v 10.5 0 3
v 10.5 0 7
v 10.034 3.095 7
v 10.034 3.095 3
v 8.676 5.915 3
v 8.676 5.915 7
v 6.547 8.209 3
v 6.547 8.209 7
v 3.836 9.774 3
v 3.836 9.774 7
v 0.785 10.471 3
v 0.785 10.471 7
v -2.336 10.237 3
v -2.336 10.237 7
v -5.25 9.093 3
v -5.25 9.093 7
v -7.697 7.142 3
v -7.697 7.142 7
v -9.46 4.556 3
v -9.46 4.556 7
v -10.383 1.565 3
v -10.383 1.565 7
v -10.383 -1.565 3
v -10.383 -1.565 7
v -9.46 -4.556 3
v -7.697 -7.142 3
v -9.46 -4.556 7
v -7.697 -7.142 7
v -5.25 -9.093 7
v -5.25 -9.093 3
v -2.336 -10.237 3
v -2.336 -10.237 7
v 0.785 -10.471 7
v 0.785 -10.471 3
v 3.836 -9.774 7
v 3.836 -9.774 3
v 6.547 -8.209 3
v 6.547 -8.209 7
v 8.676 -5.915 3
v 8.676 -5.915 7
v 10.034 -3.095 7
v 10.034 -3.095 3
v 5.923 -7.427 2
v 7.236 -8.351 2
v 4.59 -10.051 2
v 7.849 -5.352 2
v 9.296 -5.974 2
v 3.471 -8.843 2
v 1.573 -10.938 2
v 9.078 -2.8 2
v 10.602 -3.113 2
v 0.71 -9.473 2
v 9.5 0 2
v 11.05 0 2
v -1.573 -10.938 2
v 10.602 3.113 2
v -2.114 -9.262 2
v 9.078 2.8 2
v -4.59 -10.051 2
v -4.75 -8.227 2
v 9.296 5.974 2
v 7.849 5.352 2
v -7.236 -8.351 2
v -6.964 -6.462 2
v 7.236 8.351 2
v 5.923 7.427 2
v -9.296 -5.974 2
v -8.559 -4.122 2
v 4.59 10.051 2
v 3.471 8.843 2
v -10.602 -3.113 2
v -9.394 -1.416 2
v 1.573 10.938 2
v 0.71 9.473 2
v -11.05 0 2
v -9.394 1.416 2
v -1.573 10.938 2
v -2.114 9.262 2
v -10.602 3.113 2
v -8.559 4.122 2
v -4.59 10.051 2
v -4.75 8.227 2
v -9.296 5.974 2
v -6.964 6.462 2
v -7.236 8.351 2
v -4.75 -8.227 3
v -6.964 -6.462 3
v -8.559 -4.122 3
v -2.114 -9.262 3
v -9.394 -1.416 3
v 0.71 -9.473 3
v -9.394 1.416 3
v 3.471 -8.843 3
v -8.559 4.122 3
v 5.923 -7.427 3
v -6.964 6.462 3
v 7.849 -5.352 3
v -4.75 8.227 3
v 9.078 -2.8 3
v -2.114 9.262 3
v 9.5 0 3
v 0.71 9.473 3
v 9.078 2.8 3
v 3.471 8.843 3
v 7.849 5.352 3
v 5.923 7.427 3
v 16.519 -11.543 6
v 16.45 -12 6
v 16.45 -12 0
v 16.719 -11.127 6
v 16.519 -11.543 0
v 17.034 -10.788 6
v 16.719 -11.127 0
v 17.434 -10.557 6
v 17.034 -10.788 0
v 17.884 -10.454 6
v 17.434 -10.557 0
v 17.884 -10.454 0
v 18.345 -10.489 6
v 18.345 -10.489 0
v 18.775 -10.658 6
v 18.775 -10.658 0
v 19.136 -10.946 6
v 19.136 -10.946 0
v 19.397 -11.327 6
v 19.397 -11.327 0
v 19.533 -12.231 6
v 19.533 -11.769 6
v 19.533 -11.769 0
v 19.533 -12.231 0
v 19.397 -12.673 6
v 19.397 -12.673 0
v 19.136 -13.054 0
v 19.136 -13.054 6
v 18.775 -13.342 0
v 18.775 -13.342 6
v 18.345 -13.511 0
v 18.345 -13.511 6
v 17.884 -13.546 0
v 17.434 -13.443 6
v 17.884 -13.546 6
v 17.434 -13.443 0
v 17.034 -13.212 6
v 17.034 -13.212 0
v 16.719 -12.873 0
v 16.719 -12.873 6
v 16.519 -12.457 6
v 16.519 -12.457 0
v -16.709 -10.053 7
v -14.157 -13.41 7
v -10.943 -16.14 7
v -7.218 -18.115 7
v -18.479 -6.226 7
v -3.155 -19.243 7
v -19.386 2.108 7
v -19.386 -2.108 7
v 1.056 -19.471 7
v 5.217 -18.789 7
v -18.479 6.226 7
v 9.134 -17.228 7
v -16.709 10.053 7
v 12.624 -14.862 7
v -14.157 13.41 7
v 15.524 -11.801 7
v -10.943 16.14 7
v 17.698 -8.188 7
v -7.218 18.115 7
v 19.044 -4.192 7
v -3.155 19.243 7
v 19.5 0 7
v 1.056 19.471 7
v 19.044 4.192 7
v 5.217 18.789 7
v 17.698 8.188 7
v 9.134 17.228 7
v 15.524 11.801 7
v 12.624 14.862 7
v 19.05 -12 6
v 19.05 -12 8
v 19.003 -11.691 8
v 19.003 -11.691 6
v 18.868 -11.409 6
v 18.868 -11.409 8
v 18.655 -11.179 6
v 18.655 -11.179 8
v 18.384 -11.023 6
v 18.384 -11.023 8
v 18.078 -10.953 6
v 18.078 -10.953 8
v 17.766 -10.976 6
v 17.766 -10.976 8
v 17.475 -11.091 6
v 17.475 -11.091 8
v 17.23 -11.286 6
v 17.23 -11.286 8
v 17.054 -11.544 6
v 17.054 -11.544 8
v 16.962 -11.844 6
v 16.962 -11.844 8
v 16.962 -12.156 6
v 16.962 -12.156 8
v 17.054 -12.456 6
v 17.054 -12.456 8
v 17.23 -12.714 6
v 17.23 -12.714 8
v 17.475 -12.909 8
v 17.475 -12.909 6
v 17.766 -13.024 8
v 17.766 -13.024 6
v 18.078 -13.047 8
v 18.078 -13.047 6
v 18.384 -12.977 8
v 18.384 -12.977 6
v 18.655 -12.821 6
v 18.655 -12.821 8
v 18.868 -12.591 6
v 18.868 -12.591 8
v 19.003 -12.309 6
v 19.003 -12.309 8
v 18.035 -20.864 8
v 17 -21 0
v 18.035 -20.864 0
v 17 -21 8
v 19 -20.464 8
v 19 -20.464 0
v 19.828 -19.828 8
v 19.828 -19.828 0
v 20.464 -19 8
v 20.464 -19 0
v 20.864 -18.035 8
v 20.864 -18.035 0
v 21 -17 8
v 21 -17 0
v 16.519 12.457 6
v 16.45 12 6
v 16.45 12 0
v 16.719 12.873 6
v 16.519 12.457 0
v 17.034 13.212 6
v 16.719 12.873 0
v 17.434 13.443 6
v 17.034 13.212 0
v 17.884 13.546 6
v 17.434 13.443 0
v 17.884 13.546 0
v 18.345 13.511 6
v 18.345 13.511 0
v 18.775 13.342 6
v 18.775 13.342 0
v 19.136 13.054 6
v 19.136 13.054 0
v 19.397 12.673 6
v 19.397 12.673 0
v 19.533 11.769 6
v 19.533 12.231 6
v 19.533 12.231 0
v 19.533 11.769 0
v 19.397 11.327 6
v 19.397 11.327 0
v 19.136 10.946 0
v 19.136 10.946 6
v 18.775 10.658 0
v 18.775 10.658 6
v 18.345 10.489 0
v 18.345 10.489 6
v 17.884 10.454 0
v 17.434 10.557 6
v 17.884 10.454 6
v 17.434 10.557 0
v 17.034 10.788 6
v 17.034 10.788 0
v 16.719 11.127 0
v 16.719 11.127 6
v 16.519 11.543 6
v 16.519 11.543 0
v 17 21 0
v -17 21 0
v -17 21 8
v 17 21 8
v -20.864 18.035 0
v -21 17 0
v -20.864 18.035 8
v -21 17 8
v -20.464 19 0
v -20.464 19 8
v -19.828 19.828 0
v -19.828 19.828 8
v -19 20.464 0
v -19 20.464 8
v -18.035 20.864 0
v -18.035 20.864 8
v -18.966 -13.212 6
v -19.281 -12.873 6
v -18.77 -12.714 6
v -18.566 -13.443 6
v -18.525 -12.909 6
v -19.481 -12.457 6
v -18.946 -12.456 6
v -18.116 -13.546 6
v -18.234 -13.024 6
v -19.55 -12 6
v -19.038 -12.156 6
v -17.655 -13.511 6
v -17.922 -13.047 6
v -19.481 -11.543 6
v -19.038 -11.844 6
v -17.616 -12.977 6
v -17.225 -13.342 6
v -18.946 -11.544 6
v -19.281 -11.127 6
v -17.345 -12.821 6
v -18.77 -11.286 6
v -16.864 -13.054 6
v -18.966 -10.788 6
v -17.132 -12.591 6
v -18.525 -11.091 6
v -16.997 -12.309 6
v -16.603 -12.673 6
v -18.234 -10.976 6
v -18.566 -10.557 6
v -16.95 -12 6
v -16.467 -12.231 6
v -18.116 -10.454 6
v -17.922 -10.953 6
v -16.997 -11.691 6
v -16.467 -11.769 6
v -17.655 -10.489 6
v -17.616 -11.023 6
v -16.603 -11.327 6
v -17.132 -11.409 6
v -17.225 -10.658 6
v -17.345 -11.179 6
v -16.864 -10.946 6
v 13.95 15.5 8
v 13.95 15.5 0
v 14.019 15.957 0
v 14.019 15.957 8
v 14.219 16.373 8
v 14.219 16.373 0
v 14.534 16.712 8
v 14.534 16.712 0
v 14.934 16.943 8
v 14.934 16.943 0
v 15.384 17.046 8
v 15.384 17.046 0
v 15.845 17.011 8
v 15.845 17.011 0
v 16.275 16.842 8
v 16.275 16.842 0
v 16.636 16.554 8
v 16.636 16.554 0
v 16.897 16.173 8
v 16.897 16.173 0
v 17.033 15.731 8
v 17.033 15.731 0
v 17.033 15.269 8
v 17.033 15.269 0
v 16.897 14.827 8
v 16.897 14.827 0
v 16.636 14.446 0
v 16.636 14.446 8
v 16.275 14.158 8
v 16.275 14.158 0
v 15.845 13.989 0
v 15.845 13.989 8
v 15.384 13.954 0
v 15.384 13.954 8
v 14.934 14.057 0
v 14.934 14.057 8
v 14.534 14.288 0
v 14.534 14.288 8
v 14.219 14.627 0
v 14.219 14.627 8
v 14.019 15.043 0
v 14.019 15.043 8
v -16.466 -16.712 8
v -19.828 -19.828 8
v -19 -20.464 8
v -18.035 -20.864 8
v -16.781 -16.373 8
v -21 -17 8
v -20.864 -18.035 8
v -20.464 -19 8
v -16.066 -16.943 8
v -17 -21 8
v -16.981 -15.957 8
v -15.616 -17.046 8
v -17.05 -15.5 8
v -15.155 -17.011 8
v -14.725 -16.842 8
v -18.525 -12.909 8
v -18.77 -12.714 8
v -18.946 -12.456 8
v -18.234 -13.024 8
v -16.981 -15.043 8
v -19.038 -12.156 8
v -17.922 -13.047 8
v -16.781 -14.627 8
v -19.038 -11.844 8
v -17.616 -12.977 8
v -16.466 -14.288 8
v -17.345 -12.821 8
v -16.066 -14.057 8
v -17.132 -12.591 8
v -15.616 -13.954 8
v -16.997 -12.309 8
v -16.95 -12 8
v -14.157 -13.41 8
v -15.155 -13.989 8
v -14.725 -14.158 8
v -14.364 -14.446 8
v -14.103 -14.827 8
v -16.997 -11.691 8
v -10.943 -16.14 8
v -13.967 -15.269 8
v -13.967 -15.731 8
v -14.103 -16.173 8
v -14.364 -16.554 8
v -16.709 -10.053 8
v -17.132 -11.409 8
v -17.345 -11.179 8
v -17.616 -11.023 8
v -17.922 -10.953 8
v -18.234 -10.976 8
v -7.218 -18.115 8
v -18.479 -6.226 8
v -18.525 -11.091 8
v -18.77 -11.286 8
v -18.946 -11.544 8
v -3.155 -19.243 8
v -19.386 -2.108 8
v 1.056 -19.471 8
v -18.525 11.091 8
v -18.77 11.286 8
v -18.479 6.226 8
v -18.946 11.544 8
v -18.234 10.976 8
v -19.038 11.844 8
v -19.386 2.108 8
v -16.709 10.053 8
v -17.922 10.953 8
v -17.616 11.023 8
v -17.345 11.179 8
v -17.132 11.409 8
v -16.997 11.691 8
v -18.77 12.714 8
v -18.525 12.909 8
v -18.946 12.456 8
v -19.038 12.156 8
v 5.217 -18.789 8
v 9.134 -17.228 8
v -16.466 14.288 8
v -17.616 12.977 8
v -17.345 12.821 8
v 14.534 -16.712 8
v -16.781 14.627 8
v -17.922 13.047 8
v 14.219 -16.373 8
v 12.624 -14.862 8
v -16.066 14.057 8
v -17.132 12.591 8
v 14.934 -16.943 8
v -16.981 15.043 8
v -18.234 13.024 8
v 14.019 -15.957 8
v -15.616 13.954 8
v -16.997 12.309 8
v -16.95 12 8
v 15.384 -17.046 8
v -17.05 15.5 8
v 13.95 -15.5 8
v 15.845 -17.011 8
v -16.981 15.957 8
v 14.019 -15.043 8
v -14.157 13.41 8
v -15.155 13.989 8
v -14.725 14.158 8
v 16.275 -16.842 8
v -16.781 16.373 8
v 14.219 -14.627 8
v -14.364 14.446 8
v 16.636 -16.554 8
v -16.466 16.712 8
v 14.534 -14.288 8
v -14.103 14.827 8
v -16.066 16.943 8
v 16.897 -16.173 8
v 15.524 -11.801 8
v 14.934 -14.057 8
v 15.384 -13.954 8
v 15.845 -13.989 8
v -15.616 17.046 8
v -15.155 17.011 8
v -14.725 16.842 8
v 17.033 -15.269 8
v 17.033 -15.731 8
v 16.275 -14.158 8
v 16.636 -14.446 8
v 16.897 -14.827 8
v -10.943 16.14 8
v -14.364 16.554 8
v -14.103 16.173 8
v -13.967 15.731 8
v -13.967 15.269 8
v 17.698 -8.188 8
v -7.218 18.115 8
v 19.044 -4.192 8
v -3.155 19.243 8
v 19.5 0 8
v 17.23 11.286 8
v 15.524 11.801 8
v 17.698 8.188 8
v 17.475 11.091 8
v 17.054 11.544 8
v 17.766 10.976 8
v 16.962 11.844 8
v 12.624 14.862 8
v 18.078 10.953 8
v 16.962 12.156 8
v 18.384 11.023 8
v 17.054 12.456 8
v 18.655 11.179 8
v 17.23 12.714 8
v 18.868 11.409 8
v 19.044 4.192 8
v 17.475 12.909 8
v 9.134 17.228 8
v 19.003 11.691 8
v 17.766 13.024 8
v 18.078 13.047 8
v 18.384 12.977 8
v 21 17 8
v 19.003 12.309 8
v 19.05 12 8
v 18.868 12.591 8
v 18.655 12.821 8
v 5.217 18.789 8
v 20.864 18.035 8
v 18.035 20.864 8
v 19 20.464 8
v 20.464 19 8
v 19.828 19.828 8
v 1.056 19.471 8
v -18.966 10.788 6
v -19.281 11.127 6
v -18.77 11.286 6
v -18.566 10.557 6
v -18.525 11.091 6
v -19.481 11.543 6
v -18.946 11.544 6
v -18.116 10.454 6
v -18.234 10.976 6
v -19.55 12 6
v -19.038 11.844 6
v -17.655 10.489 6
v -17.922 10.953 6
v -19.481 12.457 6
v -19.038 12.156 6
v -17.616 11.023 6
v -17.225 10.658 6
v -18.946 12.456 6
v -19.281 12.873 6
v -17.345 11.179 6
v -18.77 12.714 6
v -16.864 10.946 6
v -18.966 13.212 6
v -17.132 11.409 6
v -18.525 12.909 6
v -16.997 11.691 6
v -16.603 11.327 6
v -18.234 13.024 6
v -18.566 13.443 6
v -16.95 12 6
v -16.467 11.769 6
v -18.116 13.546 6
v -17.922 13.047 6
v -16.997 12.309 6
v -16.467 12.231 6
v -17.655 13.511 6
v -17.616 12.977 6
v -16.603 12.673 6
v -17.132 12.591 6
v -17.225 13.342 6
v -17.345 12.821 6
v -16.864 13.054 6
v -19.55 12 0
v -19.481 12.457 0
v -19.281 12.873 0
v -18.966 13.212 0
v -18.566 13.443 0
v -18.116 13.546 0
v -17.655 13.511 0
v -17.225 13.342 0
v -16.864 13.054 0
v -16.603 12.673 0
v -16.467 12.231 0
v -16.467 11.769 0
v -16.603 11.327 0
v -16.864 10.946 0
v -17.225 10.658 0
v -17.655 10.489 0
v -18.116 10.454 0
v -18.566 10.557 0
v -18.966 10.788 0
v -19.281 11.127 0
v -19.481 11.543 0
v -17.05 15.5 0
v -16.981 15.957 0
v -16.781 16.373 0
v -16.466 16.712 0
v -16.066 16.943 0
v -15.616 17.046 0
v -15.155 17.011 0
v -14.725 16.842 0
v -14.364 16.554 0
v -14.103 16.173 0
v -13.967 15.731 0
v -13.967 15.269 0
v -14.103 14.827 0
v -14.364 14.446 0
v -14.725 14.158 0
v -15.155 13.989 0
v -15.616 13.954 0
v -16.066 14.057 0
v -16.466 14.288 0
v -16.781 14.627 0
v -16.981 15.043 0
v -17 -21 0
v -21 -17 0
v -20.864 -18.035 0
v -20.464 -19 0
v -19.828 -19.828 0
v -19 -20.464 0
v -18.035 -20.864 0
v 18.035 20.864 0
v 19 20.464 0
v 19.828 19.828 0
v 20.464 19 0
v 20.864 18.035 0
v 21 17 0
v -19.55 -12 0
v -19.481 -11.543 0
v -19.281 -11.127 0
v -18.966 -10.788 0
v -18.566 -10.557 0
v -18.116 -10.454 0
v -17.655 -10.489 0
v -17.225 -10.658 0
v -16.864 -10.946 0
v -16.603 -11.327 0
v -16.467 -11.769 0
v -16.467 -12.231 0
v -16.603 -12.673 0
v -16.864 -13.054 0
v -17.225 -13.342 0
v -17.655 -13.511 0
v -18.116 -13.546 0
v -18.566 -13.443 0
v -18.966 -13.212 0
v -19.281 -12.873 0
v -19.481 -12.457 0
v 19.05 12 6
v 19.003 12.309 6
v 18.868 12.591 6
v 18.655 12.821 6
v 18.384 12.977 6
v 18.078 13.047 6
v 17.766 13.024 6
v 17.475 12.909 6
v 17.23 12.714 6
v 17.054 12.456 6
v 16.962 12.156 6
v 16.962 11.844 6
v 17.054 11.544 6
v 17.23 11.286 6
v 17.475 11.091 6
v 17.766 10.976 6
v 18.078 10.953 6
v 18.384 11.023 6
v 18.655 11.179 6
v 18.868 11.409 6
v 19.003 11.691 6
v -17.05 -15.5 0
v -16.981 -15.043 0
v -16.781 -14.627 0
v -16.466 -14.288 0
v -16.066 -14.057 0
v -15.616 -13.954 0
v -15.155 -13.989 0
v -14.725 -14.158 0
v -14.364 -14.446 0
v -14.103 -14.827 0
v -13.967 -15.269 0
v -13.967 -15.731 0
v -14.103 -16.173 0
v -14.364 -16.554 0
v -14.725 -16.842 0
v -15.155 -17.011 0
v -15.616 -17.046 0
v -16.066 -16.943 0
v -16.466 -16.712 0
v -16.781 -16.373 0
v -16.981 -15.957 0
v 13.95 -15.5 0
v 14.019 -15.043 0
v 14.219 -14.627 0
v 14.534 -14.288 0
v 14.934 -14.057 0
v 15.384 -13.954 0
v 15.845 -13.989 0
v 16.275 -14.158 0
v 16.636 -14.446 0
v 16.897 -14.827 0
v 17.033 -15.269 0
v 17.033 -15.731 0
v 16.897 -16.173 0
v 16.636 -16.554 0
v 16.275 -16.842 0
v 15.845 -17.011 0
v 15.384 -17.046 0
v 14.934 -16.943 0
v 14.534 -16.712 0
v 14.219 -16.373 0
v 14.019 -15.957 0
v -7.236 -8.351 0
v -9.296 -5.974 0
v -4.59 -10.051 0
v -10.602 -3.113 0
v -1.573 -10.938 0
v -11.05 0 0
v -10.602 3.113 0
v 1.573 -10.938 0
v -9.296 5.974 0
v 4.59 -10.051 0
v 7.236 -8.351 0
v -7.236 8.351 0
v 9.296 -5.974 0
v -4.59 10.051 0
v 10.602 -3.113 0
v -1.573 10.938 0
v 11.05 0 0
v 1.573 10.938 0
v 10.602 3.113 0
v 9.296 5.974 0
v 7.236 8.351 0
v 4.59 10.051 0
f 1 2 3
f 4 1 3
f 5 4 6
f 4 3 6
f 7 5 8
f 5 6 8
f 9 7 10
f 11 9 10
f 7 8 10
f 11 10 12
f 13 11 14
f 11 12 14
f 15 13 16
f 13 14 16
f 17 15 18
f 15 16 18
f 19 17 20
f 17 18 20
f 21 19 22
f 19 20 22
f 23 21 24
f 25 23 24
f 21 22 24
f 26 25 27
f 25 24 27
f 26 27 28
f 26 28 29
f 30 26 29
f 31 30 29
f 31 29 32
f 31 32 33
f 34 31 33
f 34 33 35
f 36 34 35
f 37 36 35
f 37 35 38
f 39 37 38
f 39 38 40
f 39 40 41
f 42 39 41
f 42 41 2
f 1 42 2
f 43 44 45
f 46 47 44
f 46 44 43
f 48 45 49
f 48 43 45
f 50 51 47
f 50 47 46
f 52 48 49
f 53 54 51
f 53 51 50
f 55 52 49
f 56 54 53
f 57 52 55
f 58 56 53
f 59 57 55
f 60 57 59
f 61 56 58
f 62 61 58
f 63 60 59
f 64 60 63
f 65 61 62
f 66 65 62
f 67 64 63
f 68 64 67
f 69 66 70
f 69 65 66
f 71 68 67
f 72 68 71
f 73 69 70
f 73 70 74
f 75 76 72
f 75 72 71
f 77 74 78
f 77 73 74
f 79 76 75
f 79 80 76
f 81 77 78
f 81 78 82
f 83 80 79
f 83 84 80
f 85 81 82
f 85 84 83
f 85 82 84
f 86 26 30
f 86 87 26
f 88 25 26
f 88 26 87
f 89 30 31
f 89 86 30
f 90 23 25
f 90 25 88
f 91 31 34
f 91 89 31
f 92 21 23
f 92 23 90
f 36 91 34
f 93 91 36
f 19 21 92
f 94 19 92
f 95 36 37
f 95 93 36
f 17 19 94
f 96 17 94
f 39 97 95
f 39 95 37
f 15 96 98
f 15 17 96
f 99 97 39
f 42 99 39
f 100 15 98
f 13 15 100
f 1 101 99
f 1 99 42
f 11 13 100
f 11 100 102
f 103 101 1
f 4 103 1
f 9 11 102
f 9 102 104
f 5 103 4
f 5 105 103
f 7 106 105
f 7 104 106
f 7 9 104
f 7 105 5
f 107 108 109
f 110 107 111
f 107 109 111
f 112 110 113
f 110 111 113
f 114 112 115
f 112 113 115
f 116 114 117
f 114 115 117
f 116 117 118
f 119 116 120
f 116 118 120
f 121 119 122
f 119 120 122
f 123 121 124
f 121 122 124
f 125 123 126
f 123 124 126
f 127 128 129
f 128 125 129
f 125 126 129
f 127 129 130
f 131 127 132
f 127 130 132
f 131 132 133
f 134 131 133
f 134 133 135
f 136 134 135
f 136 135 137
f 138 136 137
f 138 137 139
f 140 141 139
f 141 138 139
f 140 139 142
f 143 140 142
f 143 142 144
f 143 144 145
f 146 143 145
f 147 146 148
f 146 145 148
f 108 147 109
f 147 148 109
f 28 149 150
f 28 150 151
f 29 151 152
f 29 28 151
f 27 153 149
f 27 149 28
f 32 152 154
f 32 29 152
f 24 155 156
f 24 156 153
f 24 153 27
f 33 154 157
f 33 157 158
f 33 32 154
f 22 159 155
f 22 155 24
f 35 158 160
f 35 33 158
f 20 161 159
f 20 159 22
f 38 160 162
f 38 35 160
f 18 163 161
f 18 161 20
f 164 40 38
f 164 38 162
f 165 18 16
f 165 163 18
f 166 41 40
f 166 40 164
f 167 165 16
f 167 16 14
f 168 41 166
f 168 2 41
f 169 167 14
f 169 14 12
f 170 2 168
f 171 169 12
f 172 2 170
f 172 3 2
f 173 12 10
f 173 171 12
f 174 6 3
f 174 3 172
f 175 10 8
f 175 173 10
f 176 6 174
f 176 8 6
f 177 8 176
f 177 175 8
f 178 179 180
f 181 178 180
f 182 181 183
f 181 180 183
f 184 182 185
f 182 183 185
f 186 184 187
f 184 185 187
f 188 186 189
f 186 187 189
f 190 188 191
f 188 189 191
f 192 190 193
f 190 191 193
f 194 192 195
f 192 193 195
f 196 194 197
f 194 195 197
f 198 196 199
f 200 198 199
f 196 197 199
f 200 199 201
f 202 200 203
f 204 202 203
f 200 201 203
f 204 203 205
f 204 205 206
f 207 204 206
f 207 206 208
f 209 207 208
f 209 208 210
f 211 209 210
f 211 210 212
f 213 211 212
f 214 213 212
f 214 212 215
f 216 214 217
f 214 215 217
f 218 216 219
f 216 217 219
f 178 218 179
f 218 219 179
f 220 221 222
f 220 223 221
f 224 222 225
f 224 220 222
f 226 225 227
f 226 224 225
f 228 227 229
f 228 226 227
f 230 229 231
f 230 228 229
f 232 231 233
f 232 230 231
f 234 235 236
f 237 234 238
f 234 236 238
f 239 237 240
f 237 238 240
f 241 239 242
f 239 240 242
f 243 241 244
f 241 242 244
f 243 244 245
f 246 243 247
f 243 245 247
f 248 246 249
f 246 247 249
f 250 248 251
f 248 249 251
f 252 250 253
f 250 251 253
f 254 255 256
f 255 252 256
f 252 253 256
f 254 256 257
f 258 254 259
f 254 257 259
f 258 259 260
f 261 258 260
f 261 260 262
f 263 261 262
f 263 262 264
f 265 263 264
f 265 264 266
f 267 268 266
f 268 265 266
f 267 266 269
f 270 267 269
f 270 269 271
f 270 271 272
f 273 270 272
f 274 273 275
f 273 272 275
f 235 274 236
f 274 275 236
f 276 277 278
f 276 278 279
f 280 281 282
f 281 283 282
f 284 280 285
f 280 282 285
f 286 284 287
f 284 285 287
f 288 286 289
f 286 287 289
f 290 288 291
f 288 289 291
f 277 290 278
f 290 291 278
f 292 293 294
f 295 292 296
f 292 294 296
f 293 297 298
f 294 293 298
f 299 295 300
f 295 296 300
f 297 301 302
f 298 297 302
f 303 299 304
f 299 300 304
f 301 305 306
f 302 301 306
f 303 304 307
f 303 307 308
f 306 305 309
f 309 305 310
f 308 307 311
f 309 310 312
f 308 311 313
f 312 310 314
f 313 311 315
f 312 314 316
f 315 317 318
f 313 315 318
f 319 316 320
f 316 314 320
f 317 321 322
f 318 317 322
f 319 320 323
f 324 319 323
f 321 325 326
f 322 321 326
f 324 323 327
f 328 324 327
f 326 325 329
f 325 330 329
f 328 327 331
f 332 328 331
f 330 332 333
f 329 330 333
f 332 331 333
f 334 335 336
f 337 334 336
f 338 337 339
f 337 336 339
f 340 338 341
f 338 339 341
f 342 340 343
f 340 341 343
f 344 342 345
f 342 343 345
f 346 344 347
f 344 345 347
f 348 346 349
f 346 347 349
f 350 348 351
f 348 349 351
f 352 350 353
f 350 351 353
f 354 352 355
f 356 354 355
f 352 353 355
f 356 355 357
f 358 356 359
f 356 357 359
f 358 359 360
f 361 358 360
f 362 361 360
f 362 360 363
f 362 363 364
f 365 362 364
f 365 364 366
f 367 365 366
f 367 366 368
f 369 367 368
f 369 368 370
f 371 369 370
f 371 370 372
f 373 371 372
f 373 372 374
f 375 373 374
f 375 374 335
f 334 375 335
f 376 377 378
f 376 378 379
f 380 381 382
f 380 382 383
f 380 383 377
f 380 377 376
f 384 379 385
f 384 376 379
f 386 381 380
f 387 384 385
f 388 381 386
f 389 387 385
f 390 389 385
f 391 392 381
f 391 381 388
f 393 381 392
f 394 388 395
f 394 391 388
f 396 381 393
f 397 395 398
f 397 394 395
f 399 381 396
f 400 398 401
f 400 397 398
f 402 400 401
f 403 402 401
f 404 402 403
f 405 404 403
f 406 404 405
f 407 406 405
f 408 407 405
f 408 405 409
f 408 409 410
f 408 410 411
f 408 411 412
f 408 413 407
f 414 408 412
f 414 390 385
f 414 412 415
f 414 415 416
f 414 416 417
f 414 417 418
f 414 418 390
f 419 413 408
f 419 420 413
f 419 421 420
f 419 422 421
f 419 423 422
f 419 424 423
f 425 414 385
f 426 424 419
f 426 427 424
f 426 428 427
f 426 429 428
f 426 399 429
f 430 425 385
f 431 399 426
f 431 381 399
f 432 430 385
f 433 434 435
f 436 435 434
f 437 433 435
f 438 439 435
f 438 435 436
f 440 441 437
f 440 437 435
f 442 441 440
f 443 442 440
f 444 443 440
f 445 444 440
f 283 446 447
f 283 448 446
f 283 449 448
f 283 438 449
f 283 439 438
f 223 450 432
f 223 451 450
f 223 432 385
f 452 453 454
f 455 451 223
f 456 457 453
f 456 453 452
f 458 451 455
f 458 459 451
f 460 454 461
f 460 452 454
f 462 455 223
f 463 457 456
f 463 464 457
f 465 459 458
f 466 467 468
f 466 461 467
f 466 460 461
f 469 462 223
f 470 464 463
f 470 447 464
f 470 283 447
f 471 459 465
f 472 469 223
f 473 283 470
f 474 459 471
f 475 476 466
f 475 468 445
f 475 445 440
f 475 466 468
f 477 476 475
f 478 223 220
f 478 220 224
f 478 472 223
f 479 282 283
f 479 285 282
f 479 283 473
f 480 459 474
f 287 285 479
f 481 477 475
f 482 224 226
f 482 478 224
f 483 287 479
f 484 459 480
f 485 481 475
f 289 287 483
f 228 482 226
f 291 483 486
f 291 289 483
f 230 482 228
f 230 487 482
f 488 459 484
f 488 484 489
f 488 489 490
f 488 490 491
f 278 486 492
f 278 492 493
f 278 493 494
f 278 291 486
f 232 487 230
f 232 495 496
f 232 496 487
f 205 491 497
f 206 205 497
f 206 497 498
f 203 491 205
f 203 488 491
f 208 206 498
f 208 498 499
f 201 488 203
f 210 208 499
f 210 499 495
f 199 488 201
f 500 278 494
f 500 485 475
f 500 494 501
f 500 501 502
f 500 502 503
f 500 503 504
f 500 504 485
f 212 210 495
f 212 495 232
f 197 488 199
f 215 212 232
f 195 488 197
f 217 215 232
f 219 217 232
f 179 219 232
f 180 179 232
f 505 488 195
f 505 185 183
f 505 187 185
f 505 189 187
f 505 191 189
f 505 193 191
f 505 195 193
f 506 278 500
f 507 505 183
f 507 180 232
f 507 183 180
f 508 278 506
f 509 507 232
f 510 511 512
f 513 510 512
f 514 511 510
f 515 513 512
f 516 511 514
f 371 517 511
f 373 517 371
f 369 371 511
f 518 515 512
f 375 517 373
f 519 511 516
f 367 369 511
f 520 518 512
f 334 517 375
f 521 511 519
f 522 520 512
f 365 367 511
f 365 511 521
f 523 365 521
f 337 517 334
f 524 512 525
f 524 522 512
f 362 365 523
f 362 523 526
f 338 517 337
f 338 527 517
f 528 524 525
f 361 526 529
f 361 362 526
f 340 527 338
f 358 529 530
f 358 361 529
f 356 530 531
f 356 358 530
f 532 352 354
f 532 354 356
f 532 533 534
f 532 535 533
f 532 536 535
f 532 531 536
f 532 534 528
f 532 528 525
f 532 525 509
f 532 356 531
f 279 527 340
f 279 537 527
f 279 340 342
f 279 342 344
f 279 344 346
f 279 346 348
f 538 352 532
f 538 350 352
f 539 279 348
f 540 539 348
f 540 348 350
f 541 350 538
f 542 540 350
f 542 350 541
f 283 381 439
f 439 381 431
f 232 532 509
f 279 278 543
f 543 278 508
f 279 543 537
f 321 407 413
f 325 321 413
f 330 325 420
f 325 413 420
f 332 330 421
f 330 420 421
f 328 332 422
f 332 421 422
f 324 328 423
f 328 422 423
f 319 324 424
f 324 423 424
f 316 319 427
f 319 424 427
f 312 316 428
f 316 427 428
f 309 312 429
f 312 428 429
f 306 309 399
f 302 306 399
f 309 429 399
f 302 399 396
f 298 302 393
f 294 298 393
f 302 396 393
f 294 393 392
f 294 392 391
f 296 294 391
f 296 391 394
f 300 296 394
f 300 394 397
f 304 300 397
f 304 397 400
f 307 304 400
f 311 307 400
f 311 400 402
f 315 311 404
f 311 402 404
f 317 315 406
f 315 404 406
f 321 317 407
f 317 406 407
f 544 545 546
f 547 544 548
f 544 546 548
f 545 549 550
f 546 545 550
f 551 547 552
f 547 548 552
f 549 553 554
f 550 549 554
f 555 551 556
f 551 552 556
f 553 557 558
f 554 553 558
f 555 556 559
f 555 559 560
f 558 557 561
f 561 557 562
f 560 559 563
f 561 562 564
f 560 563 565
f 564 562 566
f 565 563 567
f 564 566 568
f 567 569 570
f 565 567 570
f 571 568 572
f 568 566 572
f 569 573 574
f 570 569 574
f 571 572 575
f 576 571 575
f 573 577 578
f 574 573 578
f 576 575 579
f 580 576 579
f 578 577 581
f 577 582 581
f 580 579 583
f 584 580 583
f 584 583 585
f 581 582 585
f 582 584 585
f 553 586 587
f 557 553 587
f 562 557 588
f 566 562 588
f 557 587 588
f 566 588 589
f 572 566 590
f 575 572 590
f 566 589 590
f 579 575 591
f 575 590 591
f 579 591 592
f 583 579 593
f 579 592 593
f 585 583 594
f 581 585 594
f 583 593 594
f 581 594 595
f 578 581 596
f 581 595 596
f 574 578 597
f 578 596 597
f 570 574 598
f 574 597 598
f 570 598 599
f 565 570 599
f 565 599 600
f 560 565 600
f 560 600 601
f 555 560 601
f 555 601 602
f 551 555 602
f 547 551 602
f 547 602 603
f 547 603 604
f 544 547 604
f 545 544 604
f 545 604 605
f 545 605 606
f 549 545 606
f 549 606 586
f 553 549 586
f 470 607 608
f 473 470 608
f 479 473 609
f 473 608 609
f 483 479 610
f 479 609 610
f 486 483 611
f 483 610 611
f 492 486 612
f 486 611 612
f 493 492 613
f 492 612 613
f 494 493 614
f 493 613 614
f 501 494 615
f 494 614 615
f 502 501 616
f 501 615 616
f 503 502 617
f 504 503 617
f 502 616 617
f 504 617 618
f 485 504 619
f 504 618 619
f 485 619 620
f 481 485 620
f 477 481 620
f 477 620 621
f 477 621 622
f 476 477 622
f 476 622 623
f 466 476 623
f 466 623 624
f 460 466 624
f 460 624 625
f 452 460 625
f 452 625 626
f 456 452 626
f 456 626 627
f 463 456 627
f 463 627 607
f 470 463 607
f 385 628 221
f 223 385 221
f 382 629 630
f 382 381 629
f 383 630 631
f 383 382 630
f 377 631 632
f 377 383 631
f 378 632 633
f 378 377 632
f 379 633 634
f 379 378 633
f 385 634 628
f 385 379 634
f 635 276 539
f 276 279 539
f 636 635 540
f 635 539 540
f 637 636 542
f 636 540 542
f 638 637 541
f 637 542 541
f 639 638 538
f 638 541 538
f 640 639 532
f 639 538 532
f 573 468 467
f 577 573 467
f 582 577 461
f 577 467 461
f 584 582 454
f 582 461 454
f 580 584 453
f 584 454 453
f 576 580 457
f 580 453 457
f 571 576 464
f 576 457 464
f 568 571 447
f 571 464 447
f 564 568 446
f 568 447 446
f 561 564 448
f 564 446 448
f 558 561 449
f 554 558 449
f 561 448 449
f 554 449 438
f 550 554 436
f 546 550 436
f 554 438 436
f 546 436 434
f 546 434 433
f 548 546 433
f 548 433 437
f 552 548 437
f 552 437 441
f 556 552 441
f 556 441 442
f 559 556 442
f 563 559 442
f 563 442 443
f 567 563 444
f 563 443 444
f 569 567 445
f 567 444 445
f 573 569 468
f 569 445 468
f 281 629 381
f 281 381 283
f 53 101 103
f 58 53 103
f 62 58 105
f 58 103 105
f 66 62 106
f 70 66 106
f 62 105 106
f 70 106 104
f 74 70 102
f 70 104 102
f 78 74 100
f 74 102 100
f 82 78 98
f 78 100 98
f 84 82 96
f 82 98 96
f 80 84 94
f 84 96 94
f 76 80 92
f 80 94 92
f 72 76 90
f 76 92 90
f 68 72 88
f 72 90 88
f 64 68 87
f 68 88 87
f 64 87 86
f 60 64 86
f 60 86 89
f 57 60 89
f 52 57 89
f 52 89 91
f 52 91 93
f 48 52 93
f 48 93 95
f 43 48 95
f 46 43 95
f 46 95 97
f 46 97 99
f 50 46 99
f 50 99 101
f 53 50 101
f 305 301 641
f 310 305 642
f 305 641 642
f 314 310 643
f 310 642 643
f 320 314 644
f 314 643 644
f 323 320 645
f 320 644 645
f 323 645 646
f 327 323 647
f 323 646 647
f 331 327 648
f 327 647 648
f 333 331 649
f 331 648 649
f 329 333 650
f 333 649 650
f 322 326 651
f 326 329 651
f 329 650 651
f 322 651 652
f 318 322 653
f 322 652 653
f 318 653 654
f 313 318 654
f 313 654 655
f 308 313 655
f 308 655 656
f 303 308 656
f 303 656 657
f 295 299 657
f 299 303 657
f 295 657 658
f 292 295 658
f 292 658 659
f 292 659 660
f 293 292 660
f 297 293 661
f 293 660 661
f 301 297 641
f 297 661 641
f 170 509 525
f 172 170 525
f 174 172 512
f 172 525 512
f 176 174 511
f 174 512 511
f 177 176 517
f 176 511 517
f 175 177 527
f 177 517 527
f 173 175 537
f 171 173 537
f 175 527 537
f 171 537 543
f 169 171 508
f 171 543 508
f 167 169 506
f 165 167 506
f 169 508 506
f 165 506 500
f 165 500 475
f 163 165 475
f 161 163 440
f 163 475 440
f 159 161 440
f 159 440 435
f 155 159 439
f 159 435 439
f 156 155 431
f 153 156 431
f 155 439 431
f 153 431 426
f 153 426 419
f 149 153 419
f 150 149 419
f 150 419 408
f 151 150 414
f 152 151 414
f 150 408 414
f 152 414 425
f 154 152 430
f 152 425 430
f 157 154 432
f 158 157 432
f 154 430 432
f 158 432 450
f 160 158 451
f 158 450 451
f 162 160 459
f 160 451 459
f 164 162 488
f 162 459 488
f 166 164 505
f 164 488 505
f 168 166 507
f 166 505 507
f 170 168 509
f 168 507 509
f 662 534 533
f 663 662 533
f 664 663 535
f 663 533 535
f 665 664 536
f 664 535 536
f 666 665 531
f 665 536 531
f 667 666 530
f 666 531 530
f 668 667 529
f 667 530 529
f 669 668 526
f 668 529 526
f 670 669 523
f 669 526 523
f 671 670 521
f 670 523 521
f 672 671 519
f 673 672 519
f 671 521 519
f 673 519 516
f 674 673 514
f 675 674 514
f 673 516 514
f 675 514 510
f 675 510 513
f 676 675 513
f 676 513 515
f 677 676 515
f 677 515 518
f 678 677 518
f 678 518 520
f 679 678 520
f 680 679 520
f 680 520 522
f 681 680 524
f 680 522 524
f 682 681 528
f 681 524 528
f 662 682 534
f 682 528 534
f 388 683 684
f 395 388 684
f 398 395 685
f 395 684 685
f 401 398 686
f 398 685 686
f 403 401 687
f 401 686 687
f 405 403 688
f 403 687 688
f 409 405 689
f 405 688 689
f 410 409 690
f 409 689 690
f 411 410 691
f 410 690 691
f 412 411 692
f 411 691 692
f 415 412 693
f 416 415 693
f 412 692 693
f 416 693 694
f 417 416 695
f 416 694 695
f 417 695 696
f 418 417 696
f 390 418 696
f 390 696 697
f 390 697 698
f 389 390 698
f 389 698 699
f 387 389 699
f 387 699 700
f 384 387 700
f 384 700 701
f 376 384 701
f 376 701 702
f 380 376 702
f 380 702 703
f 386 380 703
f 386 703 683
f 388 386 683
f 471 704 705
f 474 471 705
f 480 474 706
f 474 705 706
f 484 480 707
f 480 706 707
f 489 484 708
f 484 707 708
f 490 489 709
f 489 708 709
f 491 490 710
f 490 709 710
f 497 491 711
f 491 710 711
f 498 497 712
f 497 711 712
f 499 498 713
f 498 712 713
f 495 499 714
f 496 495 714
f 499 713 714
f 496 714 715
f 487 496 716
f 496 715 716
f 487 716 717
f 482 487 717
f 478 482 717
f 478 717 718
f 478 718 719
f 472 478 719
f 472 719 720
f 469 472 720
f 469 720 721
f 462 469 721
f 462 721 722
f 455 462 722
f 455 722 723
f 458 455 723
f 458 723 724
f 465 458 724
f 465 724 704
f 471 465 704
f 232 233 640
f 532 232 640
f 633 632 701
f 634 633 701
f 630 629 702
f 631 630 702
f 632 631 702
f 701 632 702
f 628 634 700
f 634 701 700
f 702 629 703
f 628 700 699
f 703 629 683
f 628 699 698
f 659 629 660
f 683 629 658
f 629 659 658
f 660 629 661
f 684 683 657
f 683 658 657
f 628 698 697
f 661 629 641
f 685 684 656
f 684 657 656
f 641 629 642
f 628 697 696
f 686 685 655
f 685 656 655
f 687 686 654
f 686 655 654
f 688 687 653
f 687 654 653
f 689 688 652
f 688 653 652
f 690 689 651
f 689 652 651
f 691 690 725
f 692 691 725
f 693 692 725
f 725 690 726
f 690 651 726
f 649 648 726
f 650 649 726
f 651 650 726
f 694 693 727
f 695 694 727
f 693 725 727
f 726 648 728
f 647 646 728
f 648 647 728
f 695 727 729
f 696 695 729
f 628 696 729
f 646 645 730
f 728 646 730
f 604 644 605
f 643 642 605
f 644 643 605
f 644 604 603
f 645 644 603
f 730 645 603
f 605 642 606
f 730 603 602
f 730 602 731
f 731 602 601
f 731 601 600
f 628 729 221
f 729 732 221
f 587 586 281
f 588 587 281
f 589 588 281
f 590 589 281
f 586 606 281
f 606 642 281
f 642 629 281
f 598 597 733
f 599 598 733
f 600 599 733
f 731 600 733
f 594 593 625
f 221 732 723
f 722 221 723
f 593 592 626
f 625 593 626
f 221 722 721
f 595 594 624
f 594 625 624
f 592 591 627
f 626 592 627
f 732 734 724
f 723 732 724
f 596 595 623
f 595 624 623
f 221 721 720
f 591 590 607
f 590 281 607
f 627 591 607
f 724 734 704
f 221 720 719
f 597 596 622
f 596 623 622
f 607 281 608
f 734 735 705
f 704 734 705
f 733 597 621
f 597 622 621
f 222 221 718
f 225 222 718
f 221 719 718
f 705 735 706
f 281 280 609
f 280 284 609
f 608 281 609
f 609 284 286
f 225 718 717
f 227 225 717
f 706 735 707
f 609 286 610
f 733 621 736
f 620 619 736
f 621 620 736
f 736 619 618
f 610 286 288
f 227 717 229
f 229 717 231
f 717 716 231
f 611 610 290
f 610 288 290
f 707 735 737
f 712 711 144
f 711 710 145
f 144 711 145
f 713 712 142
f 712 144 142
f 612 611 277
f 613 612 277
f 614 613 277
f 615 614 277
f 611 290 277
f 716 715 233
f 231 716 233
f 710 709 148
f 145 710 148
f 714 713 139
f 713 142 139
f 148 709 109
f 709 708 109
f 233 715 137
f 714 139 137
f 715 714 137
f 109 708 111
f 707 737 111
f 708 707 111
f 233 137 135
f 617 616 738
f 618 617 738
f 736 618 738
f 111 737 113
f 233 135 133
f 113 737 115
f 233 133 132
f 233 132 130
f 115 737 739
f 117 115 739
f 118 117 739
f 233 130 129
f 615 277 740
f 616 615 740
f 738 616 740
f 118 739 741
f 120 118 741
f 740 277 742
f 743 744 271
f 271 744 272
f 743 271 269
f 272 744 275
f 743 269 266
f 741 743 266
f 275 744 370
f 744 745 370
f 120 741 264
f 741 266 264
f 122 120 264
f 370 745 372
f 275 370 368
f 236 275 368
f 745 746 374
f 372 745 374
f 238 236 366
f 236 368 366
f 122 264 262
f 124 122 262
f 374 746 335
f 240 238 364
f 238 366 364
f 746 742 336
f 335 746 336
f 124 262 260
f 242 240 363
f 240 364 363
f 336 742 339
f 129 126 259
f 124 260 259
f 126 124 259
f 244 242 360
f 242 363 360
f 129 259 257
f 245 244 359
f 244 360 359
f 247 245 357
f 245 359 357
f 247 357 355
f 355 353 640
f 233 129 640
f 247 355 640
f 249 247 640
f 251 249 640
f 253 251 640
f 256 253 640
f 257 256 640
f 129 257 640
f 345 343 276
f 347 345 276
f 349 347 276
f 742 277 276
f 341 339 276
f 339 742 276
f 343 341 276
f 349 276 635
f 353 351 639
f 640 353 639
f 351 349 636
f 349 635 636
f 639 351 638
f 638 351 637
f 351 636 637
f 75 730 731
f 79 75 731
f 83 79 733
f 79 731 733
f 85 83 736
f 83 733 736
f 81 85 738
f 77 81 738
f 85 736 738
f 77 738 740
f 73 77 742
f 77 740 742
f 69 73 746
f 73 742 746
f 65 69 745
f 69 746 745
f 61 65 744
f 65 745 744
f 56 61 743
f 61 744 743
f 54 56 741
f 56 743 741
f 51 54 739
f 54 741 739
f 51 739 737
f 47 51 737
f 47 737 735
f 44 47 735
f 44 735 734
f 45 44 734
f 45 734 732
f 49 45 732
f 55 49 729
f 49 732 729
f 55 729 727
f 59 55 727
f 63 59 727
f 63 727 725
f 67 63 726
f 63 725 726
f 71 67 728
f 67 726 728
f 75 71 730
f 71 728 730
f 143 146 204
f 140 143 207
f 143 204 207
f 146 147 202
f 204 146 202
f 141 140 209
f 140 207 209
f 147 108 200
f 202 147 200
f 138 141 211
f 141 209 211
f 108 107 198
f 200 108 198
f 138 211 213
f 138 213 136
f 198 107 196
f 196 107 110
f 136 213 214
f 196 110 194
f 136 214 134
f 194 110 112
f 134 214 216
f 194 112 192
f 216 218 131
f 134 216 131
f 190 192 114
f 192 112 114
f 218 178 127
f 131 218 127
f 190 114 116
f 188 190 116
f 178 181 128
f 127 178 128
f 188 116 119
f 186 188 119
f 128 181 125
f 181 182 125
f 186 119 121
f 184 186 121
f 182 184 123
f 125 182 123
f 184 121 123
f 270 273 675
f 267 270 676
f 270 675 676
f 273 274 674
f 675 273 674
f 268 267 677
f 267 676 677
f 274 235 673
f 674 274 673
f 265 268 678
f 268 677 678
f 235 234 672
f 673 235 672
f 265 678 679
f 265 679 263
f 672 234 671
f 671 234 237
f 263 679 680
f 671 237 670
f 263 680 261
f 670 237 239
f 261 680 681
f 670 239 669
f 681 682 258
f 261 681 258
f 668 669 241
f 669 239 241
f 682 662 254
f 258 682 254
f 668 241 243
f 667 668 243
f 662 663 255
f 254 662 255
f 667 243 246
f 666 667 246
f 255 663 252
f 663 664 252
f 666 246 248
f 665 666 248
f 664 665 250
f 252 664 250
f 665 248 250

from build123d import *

# Parameters (mm, degrees)
SKETCH_1_W          = 42
SKETCH_1_H          = 42
EXTRUDE_1_DEPTH     = 8
SKETCH_2_R          = 9.5
CUT_EXTRUDE_1_DEPTH = 9
SKETCH_3_R          = 10.5
CUT_EXTRUDE_2_DEPTH = 5
SKETCH_6_R          = 11.05
CUT_EXTRUDE_3_DEPTH = 2
FILLET_1_R          = 4
SKETCH_8_R          = 19.5
CUT_EXTRUDE_4_DEPTH = 1
SKETCH_9_R          = 1.55
CUT_EXTRUDE_5_DEPTH = 9
SKETCH_10_R         = 1.55
CUT_EXTRUDE_6_DEPTH = 9
SKETCH_11_R         = 1.55
SKETCH_11_R_2       = 1.05
EXTRUDE_3_DEPTH     = 2


with BuildPart() as part:
    # 草图1 → 凸台-拉伸1 (new body)
    with BuildSketch(Plane.XY):
        Rectangle(SKETCH_1_W, SKETCH_1_H)
    extrude(amount=EXTRUDE_1_DEPTH)

    # 草图2 → 切除-拉伸1 (cut, through all)
    with BuildSketch(Plane.XY.offset(8)):
        Circle(SKETCH_2_R)
    extrude(amount=-CUT_EXTRUDE_1_DEPTH, mode=Mode.SUBTRACT)

    # 草图3 → 切除-拉伸2 (cut)
    with BuildSketch(Plane.XY.offset(8)):
        Circle(SKETCH_3_R)
    extrude(amount=-CUT_EXTRUDE_2_DEPTH, mode=Mode.SUBTRACT)

    # 草图6 → 切除-拉伸3 (cut)
    with BuildSketch(Plane(origin=(0, 0, 0), x_dir=(-1, 0, 0), z_dir=(0, 0, -1))):
        Circle(SKETCH_6_R)
    extrude(amount=-CUT_EXTRUDE_3_DEPTH, mode=Mode.SUBTRACT)

    # 圆角1
    fillet_1_edges = [part.edges().sort_by_distance(p)[0] for p in [
        (21, -21, 4),
        (-21, -21, 4),
        (-21, 21, 4),
        (21, 21, 4),
    ]]
    fillet(fillet_1_edges, radius=FILLET_1_R)

    # 草图8 → 切除-拉伸4 (cut)
    with BuildSketch(Plane.XY.offset(8)):
        Circle(SKETCH_8_R)
    extrude(amount=-CUT_EXTRUDE_4_DEPTH, mode=Mode.SUBTRACT)

    # 草图9 → 切除-拉伸5 (cut, through all)
    with BuildSketch(Plane(origin=(0, 0, 0), x_dir=(-1, 0, 0), z_dir=(0, 0, -1))):
        with Locations((-15.5, 15.5)):
            Circle(SKETCH_9_R)
        with Locations((15.5, 15.5)):
            Circle(SKETCH_9_R)
        with Locations((15.5, -15.5)):
            Circle(SKETCH_9_R)
        with Locations((-15.5, -15.5)):
            Circle(SKETCH_9_R)
    extrude(amount=-CUT_EXTRUDE_5_DEPTH, mode=Mode.SUBTRACT)

    # 草图10 → 切除-拉伸6 (cut, through all)
    with BuildSketch(Plane(origin=(0, 0, 0), x_dir=(-1, 0, 0), z_dir=(0, 0, -1))):
        with Locations((-18, 12)):
            Circle(SKETCH_10_R)
        with Locations((18, 12)):
            Circle(SKETCH_10_R)
        with Locations((18, -12)):
            Circle(SKETCH_10_R)
        with Locations((-18, -12)):
            Circle(SKETCH_10_R)
    extrude(amount=-CUT_EXTRUDE_6_DEPTH, mode=Mode.SUBTRACT)

    # 草图11 → 凸台-拉伸3 (add)
    with BuildSketch(Plane.XY.offset(8)):
        with Locations((-18, 12)):
            Circle(SKETCH_11_R)
        with Locations((-18, 12)):
            Circle(SKETCH_11_R_2, mode=Mode.SUBTRACT)
        with Locations((18, 12)):
            Circle(SKETCH_11_R)
        with Locations((18, 12)):
            Circle(SKETCH_11_R_2, mode=Mode.SUBTRACT)
        with Locations((18, -12)):
            Circle(SKETCH_11_R)
        with Locations((18, -12)):
            Circle(SKETCH_11_R_2, mode=Mode.SUBTRACT)
        with Locations((-18, -12)):
            Circle(SKETCH_11_R)
        with Locations((-18, -12)):
            Circle(SKETCH_11_R_2, mode=Mode.SUBTRACT)
    extrude(amount=-EXTRUDE_3_DEPTH)


solid = part.part
